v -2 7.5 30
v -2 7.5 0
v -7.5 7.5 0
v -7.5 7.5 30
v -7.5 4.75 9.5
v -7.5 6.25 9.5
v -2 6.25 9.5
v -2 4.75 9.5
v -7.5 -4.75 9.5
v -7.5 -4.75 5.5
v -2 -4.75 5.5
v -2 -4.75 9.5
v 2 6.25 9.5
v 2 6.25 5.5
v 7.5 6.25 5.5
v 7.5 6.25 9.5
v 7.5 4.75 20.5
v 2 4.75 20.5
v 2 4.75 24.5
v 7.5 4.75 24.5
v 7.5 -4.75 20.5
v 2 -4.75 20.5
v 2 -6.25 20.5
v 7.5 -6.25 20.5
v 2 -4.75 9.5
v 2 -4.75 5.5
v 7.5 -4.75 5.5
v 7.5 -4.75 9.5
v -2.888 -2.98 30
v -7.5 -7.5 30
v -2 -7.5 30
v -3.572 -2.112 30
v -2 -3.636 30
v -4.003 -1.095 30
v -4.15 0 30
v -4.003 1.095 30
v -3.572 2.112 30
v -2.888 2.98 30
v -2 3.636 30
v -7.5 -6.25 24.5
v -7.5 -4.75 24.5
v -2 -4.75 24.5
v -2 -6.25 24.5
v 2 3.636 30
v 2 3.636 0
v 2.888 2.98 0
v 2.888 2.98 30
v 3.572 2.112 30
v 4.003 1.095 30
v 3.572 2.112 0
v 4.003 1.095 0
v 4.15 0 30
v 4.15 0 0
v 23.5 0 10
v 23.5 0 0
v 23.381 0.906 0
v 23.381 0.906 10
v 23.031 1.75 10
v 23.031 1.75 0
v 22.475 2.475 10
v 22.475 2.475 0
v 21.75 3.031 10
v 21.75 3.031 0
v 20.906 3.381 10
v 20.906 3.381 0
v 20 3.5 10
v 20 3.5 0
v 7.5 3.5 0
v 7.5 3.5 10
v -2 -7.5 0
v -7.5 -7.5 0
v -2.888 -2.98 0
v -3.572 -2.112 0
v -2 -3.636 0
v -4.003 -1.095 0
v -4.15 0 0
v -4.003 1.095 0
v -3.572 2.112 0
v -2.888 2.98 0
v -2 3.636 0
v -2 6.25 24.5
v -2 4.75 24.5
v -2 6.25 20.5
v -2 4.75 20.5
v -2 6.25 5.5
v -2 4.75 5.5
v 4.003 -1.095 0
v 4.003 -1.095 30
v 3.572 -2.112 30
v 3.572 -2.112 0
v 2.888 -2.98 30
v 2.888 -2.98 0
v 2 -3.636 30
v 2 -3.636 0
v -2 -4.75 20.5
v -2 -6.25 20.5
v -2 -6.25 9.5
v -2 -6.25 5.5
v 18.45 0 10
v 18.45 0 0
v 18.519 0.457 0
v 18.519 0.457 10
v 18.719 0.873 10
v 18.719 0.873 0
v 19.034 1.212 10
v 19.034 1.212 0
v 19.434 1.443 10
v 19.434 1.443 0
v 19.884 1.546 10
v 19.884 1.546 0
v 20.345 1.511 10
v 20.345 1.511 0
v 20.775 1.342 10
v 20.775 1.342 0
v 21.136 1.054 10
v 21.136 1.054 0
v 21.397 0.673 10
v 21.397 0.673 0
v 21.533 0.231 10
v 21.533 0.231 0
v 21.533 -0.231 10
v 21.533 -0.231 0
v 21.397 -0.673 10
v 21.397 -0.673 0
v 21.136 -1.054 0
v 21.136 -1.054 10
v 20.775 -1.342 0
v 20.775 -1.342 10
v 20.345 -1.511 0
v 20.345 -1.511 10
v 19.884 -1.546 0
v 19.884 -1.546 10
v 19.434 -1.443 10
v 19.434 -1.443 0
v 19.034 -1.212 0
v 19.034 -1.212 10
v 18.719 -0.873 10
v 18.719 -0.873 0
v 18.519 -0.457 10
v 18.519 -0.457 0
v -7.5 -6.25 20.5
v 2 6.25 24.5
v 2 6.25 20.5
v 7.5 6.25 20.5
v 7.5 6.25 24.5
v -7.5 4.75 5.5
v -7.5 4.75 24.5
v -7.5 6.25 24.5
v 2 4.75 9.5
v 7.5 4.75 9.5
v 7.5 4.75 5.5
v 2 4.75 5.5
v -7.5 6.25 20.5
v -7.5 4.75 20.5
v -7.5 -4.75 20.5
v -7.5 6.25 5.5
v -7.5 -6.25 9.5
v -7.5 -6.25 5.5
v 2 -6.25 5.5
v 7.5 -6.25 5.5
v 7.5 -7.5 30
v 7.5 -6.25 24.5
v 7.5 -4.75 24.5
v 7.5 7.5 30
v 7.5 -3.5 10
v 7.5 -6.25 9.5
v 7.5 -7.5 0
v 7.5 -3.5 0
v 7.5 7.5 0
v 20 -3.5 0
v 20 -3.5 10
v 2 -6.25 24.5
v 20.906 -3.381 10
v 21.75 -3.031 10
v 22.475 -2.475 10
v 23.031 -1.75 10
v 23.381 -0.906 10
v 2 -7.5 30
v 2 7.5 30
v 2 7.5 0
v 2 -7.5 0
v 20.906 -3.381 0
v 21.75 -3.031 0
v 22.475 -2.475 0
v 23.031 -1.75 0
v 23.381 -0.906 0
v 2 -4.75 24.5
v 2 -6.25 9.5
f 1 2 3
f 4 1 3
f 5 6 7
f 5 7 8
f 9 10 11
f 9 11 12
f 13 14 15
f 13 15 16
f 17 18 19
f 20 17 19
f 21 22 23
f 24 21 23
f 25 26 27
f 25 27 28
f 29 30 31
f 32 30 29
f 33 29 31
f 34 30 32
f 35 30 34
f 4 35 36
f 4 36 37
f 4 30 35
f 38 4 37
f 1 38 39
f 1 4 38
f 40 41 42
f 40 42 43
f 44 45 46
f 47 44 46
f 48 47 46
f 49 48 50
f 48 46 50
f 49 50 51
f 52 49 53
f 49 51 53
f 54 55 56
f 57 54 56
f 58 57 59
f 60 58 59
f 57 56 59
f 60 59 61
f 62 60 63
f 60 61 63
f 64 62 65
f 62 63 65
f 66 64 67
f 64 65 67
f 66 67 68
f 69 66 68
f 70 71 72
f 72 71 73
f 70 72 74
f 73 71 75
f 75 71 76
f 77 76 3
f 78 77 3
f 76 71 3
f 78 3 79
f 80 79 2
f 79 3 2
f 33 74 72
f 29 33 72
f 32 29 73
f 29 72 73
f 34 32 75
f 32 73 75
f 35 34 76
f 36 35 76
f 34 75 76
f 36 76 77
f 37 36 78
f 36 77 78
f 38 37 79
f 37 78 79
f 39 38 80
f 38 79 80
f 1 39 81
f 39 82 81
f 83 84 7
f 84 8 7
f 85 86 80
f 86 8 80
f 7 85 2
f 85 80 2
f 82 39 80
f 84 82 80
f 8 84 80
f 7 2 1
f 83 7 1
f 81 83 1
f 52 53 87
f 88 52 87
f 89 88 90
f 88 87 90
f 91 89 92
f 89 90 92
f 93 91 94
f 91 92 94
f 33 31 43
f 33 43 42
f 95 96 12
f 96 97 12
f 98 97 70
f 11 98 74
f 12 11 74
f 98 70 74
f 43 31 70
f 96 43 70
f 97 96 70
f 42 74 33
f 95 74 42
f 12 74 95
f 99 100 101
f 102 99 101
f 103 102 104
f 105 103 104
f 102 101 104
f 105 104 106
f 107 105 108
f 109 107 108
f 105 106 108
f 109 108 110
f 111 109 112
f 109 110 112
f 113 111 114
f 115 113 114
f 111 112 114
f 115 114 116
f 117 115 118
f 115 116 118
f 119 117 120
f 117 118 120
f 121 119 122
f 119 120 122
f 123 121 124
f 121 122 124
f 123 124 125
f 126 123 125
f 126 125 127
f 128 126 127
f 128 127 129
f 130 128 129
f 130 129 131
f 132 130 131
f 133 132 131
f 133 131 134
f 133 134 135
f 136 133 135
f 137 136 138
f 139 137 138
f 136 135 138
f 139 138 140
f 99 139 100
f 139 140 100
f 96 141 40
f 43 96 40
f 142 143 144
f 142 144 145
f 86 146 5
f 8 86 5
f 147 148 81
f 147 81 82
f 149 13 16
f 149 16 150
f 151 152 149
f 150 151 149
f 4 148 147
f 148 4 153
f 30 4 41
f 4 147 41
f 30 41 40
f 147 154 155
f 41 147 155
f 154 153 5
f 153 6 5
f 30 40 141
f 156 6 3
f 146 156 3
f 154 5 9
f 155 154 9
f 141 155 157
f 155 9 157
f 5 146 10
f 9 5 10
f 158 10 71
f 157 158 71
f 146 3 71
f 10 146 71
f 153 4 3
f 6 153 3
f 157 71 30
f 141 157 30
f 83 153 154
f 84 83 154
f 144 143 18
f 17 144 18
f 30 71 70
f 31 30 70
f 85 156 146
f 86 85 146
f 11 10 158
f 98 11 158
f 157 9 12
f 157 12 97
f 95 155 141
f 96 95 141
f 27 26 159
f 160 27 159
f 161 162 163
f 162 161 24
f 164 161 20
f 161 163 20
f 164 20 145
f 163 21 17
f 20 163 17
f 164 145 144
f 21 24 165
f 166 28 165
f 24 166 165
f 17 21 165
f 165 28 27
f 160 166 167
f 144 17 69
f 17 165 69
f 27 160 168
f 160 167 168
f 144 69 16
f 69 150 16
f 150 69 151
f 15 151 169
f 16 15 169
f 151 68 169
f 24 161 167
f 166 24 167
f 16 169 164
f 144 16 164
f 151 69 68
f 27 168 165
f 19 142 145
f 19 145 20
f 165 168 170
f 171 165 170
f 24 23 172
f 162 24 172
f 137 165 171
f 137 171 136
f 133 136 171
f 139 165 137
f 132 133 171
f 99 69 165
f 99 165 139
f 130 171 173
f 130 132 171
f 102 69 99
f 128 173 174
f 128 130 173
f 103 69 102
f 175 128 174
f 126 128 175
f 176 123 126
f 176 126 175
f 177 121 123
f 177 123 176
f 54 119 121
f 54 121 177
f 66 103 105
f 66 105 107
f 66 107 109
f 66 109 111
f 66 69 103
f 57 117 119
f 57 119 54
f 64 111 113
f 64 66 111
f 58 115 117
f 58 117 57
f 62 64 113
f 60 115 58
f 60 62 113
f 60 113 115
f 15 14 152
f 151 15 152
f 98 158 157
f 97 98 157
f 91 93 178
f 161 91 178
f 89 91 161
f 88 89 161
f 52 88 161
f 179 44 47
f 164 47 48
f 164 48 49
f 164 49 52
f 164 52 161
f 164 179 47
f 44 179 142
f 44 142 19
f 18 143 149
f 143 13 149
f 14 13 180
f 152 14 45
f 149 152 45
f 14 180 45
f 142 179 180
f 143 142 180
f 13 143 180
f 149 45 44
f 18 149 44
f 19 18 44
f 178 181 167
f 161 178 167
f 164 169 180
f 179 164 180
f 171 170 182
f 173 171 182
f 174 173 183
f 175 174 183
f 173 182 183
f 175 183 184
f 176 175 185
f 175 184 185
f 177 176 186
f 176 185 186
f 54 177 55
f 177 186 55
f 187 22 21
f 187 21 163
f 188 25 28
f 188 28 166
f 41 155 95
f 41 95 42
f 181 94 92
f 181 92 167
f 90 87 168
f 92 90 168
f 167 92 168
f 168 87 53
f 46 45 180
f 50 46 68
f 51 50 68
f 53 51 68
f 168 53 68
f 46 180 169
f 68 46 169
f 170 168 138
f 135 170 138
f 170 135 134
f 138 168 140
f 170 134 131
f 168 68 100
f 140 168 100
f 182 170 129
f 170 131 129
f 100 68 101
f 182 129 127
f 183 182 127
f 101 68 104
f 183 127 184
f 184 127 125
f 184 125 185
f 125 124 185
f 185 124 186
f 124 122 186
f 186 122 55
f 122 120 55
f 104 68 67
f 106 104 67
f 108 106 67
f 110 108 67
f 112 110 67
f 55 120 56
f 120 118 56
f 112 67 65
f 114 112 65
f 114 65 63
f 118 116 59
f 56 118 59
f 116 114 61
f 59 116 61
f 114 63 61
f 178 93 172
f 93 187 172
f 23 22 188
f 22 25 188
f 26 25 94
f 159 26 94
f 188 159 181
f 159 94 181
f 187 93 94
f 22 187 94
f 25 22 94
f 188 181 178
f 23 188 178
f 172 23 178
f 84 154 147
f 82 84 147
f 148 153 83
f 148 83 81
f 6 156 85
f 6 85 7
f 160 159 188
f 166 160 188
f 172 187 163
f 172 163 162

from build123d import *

# Parameters (mm, degrees)
F1_DEPTH = 30
F2_W     = 1.5
F2_H     = 4
F3_DEPTH = 15
F4_DEPTH = 10


# Not quite as in the source:
# - a feature names something its author has since deleted; it is built from what else it names


with BuildPart() as f1:
    # F0 (on Top) → F1 (new body)
    with BuildSketch(Plane.XY):
        with BuildLine():
            ThreePointArc((-2, -3.6362755671), (-4.15, 0), (-2, 3.6362755671))
            Line((-2, 3.6362755671), (-2, 7.5))
            Line((-2, 7.5), (-7.5, 7.5))
            Line((-7.5, 7.5), (-7.5, -7.5))
            Line((-7.5, -7.5), (-2, -7.5))
            Line((-2, -7.5), (-2, -3.6362755671))
        make_face()
    extrude(amount=F1_DEPTH)


with BuildPart() as f1b:
    # F0 (on Top) → F1, piece 2 (new body)
    with BuildSketch(Plane.XY):
        with BuildLine():
            ThreePointArc((2, 3.6362755671), (3.572289182, 2.1121671335), (4.15, 0))
            Line((4.15, 0), (7.5, 0))
            Line((7.5, 0), (7.5, 3.5))
            Line((7.5, 3.5), (7.5, 7.5))
            Line((7.5, 7.5), (2, 7.5))
            Line((2, 7.5), (2, 3.6362755671))
        make_face()
        with BuildLine():
            Line((7.5, 0), (4.15, 0))
            ThreePointArc((4.15, 0), (3.572289182, -2.1121671335), (2, -3.6362755671))
            Line((2, -3.6362755671), (2, -7.5))
            Line((2, -7.5), (7.5, -7.5))
            Line((7.5, -7.5), (7.5, -3.5))
            Line((7.5, -3.5), (7.5, 0))
        make_face()
    extrude(amount=F1_DEPTH)


with BuildPart() as f3_tool:
    # F2 (on face) → F3 (new body, through all)
    with BuildSketch(Plane(origin=(-7.5, 0, 0), x_dir=(0, -1, 0), z_dir=(-1, 0, 0))):
        with Locations((-5.5, 22.5)):
            Rectangle(F2_W, F2_H)
        with Locations((-5.5, 7.5)):
            Rectangle(F2_W, F2_H)
        with Locations((5.5, 7.5)):
            Rectangle(F2_W, F2_H)
        with Locations((5.5, 22.5)):
            Rectangle(F2_W, F2_H)
    extrude(amount=-F3_DEPTH)


with BuildPart() as f1_1:
    add(f1.part)

    # F3: cut by f3_tool
    add(f3_tool.part, mode=Mode.SUBTRACT)


with BuildPart() as f1b_1:
    add(f1b.part)

    # F3: cut by f3_tool
    add(f3_tool.part, mode=Mode.SUBTRACT)

    # F0 (on Top) → F4 (join)
    with BuildSketch(Plane.XY):
        with BuildLine():
            Line((7.5, 3.5), (7.5, 0))
            Line((7.5, 0), (16.5, 0))
            ThreePointArc((16.5, 0), (17.5251262658, 2.4748737342), (20, 3.5))
            Line((20, 3.5), (7.5, 3.5))
        make_face()
        with BuildLine():
            ThreePointArc((20, 3.5), (17.5251262658, 2.4748737342), (16.5, 0))
            ThreePointArc((16.5, 0), (17.5251262658, -2.4748737342), (20, -3.5))
            ThreePointArc((20, -3.5), (22.4748737342, -2.4748737342), (23.5, 0))
            ThreePointArc((23.5, 0), (22.4748737342, 2.4748737342), (20, 3.5))
        make_face()
        with BuildLine():
            ThreePointArc((21.55, 0), (20, -1.55), (18.45, 0))
            ThreePointArc((18.45, 0), (20, 1.55), (21.55, 0))
        make_face(mode=Mode.SUBTRACT)
        with BuildLine():
            Line((16.5, 0), (7.5, 0))
            Line((7.5, 0), (7.5, -3.5))
            Line((7.5, -3.5), (20, -3.5))
            ThreePointArc((20, -3.5), (17.5251262658, -2.4748737342), (16.5, 0))
        make_face()
    extrude(amount=F4_DEPTH)


solid = Compound([f1_1.part, f1b_1.part])
